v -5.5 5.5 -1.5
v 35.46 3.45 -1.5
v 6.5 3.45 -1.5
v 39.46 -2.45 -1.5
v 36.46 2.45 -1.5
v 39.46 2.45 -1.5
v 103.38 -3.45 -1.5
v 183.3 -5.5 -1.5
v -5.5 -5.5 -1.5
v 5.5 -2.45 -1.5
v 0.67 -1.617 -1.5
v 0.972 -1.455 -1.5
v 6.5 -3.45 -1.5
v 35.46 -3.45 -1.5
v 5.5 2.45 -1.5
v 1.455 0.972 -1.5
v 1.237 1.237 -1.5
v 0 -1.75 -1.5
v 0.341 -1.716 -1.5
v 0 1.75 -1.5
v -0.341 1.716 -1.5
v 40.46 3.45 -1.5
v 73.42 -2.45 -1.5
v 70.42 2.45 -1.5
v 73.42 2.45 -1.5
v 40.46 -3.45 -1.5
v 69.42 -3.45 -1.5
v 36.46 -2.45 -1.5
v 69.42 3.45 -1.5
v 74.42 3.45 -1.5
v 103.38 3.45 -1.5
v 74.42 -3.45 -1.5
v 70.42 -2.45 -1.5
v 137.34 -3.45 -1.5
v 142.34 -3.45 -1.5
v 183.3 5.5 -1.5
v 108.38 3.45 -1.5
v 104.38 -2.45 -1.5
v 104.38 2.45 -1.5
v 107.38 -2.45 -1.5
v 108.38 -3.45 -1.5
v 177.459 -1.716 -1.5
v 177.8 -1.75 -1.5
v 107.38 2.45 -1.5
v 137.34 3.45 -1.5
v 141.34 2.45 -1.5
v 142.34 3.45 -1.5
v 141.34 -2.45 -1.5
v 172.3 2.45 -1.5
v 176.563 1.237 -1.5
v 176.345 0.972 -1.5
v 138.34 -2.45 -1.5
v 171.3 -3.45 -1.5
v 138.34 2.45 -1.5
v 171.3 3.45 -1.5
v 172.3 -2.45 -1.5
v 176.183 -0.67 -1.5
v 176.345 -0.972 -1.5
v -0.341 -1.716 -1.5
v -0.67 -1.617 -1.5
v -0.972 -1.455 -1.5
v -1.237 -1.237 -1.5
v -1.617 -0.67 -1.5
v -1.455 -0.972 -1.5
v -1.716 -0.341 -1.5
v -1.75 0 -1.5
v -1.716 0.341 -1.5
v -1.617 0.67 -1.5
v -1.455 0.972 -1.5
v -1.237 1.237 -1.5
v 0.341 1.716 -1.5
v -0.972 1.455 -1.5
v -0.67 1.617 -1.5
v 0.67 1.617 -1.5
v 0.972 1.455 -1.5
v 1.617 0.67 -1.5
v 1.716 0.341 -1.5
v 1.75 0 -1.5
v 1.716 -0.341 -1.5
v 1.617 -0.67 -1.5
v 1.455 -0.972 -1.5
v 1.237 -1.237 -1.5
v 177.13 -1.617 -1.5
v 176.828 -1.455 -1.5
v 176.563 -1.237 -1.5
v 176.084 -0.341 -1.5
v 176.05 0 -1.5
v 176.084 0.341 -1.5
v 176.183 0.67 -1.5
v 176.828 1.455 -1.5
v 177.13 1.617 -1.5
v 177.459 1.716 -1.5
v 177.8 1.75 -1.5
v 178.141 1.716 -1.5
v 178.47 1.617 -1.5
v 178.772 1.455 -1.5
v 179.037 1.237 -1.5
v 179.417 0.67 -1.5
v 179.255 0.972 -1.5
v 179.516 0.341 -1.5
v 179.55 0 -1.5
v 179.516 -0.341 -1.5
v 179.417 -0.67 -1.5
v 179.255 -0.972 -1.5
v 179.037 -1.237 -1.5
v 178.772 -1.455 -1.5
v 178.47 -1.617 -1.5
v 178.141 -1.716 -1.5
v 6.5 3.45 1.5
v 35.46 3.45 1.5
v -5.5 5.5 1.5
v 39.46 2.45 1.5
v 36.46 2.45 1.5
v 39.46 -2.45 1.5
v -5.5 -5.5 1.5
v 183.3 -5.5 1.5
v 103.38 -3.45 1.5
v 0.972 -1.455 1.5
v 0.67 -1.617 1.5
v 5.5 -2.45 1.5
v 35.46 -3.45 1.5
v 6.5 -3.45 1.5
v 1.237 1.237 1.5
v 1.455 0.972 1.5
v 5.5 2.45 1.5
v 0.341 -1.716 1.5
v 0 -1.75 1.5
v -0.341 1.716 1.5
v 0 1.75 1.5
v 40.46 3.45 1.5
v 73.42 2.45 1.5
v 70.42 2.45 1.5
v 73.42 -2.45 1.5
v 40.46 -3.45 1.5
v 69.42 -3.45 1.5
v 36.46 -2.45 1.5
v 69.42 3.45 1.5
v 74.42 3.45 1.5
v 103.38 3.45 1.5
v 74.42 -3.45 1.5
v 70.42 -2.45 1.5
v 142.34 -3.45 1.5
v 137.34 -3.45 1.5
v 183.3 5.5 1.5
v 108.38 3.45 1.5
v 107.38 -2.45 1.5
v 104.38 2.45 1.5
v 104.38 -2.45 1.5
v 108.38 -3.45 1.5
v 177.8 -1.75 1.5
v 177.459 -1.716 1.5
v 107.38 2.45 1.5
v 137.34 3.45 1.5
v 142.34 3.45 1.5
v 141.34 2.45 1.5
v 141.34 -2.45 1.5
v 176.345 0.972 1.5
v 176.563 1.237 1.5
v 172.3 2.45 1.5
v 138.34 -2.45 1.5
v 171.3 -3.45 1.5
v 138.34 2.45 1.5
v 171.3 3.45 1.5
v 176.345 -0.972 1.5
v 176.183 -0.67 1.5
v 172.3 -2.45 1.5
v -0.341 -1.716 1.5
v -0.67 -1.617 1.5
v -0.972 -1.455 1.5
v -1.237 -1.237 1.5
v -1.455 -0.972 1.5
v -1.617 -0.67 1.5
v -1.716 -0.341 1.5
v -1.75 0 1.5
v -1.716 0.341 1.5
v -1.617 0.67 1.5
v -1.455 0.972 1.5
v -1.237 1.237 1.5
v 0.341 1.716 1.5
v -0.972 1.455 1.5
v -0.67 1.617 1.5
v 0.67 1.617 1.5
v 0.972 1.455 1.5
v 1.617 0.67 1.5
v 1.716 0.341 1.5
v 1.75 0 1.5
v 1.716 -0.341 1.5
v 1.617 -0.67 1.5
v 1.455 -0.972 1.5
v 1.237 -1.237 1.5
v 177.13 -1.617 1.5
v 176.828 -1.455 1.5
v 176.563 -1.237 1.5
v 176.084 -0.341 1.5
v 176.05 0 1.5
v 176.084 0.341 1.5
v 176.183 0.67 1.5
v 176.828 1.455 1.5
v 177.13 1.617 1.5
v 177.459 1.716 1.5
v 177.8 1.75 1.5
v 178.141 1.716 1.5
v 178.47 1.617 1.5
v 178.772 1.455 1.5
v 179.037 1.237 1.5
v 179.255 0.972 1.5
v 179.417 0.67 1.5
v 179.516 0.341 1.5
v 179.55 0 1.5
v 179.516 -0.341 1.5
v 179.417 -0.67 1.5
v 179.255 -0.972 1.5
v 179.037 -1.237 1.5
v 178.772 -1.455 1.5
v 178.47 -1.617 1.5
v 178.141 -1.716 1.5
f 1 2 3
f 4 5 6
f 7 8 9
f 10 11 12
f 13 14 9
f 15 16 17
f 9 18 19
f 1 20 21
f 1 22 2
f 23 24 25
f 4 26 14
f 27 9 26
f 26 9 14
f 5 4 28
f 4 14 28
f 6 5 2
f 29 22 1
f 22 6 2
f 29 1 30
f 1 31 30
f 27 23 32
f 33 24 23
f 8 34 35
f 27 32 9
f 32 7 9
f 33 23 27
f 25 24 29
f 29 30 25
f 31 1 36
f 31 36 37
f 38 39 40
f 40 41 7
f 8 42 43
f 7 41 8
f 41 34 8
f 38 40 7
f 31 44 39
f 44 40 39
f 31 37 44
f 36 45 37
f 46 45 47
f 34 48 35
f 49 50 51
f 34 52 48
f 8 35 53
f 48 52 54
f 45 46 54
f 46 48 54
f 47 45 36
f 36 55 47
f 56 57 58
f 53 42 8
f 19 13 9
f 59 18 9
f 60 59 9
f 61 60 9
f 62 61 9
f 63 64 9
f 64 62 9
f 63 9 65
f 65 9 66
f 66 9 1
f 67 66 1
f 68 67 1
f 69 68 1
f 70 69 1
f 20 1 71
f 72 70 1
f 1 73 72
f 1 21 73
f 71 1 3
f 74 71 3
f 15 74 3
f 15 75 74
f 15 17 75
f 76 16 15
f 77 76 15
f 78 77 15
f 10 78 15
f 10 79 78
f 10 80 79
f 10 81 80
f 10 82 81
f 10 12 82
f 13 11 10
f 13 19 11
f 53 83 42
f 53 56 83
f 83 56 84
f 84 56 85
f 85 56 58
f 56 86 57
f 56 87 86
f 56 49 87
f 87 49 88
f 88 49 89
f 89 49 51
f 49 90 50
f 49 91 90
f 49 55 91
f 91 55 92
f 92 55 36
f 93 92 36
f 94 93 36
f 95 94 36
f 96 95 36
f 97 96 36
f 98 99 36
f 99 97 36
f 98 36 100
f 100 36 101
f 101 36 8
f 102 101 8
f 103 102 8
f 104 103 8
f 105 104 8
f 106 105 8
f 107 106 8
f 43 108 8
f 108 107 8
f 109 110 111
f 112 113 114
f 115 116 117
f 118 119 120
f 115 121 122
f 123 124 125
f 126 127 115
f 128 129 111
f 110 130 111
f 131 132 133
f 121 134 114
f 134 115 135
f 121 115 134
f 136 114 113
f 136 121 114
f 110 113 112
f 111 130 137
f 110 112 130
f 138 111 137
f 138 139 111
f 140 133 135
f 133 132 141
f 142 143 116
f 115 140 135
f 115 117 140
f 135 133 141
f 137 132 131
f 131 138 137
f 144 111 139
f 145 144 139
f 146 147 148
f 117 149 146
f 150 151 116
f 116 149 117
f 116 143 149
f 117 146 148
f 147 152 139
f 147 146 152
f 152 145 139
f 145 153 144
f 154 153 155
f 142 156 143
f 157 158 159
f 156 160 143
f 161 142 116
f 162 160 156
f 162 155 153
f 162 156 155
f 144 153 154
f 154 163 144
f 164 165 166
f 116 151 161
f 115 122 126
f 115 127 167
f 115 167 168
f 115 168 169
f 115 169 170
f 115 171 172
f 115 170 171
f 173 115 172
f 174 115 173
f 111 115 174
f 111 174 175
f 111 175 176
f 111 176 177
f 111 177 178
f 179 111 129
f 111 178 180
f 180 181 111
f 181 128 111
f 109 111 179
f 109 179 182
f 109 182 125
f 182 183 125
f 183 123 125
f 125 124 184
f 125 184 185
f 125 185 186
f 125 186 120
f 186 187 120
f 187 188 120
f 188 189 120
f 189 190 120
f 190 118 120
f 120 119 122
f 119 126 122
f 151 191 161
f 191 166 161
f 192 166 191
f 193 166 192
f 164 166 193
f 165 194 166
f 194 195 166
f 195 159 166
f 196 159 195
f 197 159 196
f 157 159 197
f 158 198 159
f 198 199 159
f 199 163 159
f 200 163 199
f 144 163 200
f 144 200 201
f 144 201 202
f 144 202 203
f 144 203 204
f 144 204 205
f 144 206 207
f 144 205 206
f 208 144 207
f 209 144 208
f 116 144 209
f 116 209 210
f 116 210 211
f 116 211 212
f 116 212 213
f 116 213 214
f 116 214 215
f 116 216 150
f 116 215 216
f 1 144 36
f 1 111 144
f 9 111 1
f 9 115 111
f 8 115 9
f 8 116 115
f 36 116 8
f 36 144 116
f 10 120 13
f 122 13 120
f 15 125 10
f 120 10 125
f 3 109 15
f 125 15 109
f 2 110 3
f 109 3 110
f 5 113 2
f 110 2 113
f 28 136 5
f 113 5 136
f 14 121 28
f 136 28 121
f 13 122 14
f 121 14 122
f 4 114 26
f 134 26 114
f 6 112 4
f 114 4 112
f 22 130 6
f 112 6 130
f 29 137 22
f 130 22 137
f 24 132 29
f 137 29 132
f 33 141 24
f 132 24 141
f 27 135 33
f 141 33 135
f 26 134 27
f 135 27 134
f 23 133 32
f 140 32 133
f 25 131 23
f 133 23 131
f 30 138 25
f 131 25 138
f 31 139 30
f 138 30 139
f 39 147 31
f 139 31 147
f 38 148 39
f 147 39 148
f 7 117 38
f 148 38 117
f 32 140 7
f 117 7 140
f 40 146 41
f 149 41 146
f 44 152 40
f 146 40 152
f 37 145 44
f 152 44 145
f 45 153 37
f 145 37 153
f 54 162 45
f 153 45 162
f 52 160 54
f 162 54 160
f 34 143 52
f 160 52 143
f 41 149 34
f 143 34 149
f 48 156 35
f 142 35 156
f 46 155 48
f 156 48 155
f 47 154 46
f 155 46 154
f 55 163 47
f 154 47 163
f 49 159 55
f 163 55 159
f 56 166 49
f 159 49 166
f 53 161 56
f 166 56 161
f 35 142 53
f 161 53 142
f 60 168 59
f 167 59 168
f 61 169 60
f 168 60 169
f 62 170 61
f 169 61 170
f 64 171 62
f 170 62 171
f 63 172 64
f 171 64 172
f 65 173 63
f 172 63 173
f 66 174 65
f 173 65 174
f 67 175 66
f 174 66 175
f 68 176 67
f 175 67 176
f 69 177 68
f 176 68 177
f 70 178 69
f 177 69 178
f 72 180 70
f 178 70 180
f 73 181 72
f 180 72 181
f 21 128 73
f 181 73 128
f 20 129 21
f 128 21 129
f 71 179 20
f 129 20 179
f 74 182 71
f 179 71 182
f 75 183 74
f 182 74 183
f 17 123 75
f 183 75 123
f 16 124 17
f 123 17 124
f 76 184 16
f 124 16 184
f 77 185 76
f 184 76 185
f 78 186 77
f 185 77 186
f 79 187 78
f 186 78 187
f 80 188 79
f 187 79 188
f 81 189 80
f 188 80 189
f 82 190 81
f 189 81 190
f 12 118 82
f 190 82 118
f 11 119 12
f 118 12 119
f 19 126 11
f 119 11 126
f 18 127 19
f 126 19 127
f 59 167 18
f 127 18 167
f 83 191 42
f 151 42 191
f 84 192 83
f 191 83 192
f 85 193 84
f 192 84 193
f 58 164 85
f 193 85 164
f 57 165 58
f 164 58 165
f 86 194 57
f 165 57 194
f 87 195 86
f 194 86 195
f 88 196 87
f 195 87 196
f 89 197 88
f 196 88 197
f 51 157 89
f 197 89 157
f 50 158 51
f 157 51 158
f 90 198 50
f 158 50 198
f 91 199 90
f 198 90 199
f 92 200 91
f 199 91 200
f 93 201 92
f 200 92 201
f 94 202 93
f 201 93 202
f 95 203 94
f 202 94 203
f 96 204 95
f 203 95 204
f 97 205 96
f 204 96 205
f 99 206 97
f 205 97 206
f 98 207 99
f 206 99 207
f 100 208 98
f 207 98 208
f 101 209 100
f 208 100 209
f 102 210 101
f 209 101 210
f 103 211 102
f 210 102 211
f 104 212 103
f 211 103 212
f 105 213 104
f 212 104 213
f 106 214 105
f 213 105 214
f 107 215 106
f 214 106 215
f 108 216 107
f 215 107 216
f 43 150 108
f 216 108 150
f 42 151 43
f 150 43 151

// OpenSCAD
// file: common.scad
// =============================================================================
// MakerPanel System OpenSCAD Models
// Copyright (c) 2025 Ranch Hand Robotics, LLC. All rights reserved.
// Licensed under MIT License: https://opensource.org/licenses/MIT
// Modular maker panel system with T-slot rail mounting support
// All dimensions in millimeters
// =============================================================================

// ============================================
// Constants
// ============================================

// Panel Units
HP = 5.08;           // Horizontal Pitch = 5.08mm (0.200")
U = 44.45;           // Vertical Unit outer span = 44.45mm (1.75")

// T-Slot Specifications
// Standard T-slot twist nuts (M5/M6 compatible, drop-in style)
T_SLOT_HEIGHT = 6.9;           // T-slot nut width (M5/M6)
T_SLOT_WIDTH = 5.75 * HP;      // 5.75 HP (29.06mm) avoids even 4-HP grid alignment
T_SLOT_CORNER_RADIUS = 1.0;

// Rack Specifications
RACK_SUPPORT_WIDTH = 3; 
RACK_HOLE_DIAMETER = 3.5;   // M3 mounting holes
RACK_RAIL_HEIGHT = 11; 
RACK_RAIL_THICKNESS = 3;    // Rail material thickness

// Rack Widths
RACK_19_WIDTH = 465.1;      // 19" rack outer width
RACK_10_WIDTH = 254;        // 10" rack outer width (approx)

// Panel Specifications
PANEL_THICKNESS = 3;        // Aluminum panel thickness
PANEL_DEPTH_MAX = 60;       // Maximum panel depth from front
MOUNT_HOLE_DIAMETER = 3.5;  // M3 mounting hole (for T-nuts)


// ============================================
// Utility Functions
// ============================================

// Convert HP to millimeters
function hp_to_mm(hp) = hp * HP;

// Convert U to millimeters
function u_to_mm(u) = u * U;

// Convert U to clear opening between adjacent T-slots.
// For 1U this is: U - (2 * T_SLOT_HEIGHT).
function u_clear_to_mm(u) = u * U - 2 * T_SLOT_HEIGHT;
// file: panel.scad
// Makerpanel System OpenSCAD Models
// Copyright (c) 2025 Ranch Hand Robotics, LLC. All rights reserved.
// Licensed under MIT License: https://opensource.org/licenses/MIT
// Modular maker panel system with rack mounting support
// All dimensions in millimeters
include <common.scad>

// ============================================
// Module: Panel with T-Slot Mounting Holes
// ============================================

module makerpanel_2d(width_hp, height_u, mount_hole_diameter=MOUNT_HOLE_DIAMETER) {
    /*
        Creates a 2D maker panel profile with T-slot mounting holes (M5/M6 compatible)
    Parameters:
      - width_hp: width in HP units
      - height_u: height in U units
            - mount_hole_diameter: mounting hole diameter in mm (default from common.scad)
    */
    
    width_mm = hp_to_mm(width_hp);
    height_mm = u_to_mm(height_u);
    half_w = width_mm / 2;
    half_h = height_mm / 2;
    
    // Calculate mounting hole positions - 4 holes at corners
    // Centered within RACK_RAIL_HEIGHT from each edge
    hole_inset_x = RACK_RAIL_HEIGHT / 2;
    hole_inset_y = RACK_RAIL_HEIGHT / 2;
    
    difference() {
        // Base panel
        square([width_mm, height_mm], center=true);
        
        // 4 corner mounting holes (M3 for T-nuts)
        // Bottom-left
        translate([-(half_w - hole_inset_x), -(half_h - hole_inset_y)])
            circle(r=mount_hole_diameter/2, $fn=32);
        
        // Bottom-right
        translate([(half_w - hole_inset_x), -(half_h - hole_inset_y)])
            circle(r=mount_hole_diameter/2, $fn=32);
        
        // Top-left
        translate([-(half_w - hole_inset_x), (half_h - hole_inset_y)])
            circle(r=mount_hole_diameter/2, $fn=32);
        
        // Top-right
        translate([(half_w - hole_inset_x), (half_h - hole_inset_y)])
            circle(r=mount_hole_diameter/2, $fn=32);
    }
}

module makerpanel(width_hp, height_u, thickness=PANEL_THICKNESS, mount_hole_diameter=MOUNT_HOLE_DIAMETER) {
    /*
    Creates a maker panel with T-slot mounting holes (M5/M6 compatible)
    Parameters:
      - width_hp: width in HP units
      - height_u: height in U units
      - thickness: panel thickness in mm (default 3mm aluminum)
            - mount_hole_diameter: mounting hole diameter in mm (default from common.scad)
    */
    linear_extrude(height=thickness)
        makerpanel_2d(width_hp, height_u, mount_hole_diameter=mount_hole_diameter);
}
// file: rails.scad
// =============================================================================
// MakerPanel Rail System - T-Slot Compatible Modules
// Copyright (c) 2025 Ranch Hand Robotics, LLC. All rights reserved.
// Licensed under MIT License: https://opensource.org/licenses/MIT
// ============================================================================
// All rail modules use standard T-slot nuts for universal compatibility
// Supports M5/M6 T-slot twist nuts and drop-in T-nuts
// ============================================================================

include <common.scad>

// ============================================
// Helper: Rounded Square (2D)
// ============================================

module rounded_square(size, r=1) {
    /*
    Creates a 2D rectangle with rounded corners
    Parameters:
      - size: [width, height] or single value
      - r: corner radius
    */
    s = is_list(size) ? size : [size, size];
    r_clamped = min(r, min(s[0], s[1]) / 2);
    offset(r=r_clamped)
        offset(delta=-r_clamped)
            square(s, center=false);
}

// ============================================
// Module: T-Slot Horizontal Cross-Rail 2D Profile
// ============================================
// Generates the 2D cross-section profile that can be:
// - Extruded to create 3D rails
// - Exported as SVG/DXF for laser cutting

module maker_rail_2d(rail_width, height, mounting_holes=true, base=true) {
    /*
    Creates a 2D cross-section profile of the rail (X-Y plane)
    Parameters:
      - rail_width: rail length in mm
      - height: rail height in mm
      - mounting_holes: include mounting holes
    */

    rail_offset = mounting_holes? (-height/2) : 0;
    width = mounting_holes ? rail_width + height : rail_width;
    
    // Available space between mounting holes (equal spacing on both sides)
    available_space = mounting_holes ? (width - 2 * height) : (width - 2 * RACK_SUPPORT_WIDTH);
    
    // Calculate number of slots that fit with minimum spacing
    min_spacing = T_SLOT_WIDTH + RACK_SUPPORT_WIDTH;
    num_slots = floor((available_space + RACK_SUPPORT_WIDTH) / min_spacing);
    
    // Calculate minimum space needed
    min_space_needed = num_slots * T_SLOT_WIDTH + (num_slots - 1) * RACK_SUPPORT_WIDTH;
    
    // Calculate extra space and distribute proportionately among slots
    extra_space = available_space - min_space_needed;
    actual_slot_width = T_SLOT_WIDTH + (extra_space / num_slots);
    
    // First slot starts at height (equal distance from mounting hole to slot and hole to wall)
    first_slot_pos = mounting_holes ? height : RACK_SUPPORT_WIDTH;
    
    // Spacing between slots (center to center)
    actual_spacing = actual_slot_width + RACK_SUPPORT_WIDTH;
   
    difference() 
    {
        // Base rectangle (X-Y plane profile)
        if (base) {
            translate([rail_offset, -height/2])
                square([width, height], center=false);
        }
        
        // Cut T-slot compatible slots (rectangular cutouts with rounded corners)
        for (i = [0 : num_slots - 1]) {
            x_pos = first_slot_pos + i * actual_spacing;
            translate([x_pos + rail_offset, -T_SLOT_HEIGHT/2])
                rounded_square([actual_slot_width, T_SLOT_HEIGHT], r=T_SLOT_CORNER_RADIUS);
        }
        
        // Mounting holes on either side
        if (mounting_holes) {
            // Left mounting hole
            translate([height/2 + rail_offset, 0])
                circle(r=RACK_HOLE_DIAMETER/2, $fn=32);
            
            // Right mounting hole
            translate([width - height/2 + rail_offset, 0])
                circle(r=RACK_HOLE_DIAMETER/2, $fn=32);
        }
    }
}

// ============================================
// Module: T-Slot Horizontal Cross-Rail (3D)
// ============================================
// Uses standard T-slot twist nuts (drop-in compatible)
// Slot geometry sized for M5/M6 T-slot nuts

module maker_rail(rail_width, height=RACK_RAIL_HEIGHT, depth=RACK_RAIL_THICKNESS, mounting_holes=true) {
    /*
    Creates a horizontal cross-rail with T-slot twist nut compatibility
    Generated by extruding the 2D profile
    Parameters:
      - rail_width: rail length in mm
      - height: rail height in mm
      - depth: rail depth (front to back) in mm
      - mounting_holes: include mounting holes
    */
    linear_extrude(height=depth, center=true)
        maker_rail_2d(rail_width, height, mounting_holes);
}

// ============================================
// Module: Custom Width Maker Rack
// ============================================

module makerrack_custom(width, height) {
    /*
    Creates a rack with custom width
    Parameters:
      - width: outer width in mm
      - height: height in mm
    */
    
    rail_width = RACK_RAIL_HEIGHT;  // Using existing variable
    
    // Left rail - vertical, centered at x=0
    rotate([0, 0, 90])
        maker_rail(height, height=rail_width, depth=RACK_RAIL_THICKNESS, mounting_holes=false);
    
    // Right rail - vertical, centered at x=width
    translate([width - rail_width/2, 0, 0])
        rotate([0, 0, 90])
            maker_rail(height, height=rail_width, depth=RACK_RAIL_THICKNESS, mounting_holes=false);
}
// main file
use <rails.scad>
use <panel.scad>

/* [Part Selection] */
part = "rail"; // [rail,panel]

/* [Parameters] */
hp = 35; // Horizontal pitch for the rail or Panel(in HP units)
u = 1; // Height for the Panel (in U units)
holes = true; // Include mounting holes in the rail

if (part == "rail") {
	maker_rail(hp_to_mm(hp), mounting_holes=holes);
} else {
	makerpanel(hp, u);
}
